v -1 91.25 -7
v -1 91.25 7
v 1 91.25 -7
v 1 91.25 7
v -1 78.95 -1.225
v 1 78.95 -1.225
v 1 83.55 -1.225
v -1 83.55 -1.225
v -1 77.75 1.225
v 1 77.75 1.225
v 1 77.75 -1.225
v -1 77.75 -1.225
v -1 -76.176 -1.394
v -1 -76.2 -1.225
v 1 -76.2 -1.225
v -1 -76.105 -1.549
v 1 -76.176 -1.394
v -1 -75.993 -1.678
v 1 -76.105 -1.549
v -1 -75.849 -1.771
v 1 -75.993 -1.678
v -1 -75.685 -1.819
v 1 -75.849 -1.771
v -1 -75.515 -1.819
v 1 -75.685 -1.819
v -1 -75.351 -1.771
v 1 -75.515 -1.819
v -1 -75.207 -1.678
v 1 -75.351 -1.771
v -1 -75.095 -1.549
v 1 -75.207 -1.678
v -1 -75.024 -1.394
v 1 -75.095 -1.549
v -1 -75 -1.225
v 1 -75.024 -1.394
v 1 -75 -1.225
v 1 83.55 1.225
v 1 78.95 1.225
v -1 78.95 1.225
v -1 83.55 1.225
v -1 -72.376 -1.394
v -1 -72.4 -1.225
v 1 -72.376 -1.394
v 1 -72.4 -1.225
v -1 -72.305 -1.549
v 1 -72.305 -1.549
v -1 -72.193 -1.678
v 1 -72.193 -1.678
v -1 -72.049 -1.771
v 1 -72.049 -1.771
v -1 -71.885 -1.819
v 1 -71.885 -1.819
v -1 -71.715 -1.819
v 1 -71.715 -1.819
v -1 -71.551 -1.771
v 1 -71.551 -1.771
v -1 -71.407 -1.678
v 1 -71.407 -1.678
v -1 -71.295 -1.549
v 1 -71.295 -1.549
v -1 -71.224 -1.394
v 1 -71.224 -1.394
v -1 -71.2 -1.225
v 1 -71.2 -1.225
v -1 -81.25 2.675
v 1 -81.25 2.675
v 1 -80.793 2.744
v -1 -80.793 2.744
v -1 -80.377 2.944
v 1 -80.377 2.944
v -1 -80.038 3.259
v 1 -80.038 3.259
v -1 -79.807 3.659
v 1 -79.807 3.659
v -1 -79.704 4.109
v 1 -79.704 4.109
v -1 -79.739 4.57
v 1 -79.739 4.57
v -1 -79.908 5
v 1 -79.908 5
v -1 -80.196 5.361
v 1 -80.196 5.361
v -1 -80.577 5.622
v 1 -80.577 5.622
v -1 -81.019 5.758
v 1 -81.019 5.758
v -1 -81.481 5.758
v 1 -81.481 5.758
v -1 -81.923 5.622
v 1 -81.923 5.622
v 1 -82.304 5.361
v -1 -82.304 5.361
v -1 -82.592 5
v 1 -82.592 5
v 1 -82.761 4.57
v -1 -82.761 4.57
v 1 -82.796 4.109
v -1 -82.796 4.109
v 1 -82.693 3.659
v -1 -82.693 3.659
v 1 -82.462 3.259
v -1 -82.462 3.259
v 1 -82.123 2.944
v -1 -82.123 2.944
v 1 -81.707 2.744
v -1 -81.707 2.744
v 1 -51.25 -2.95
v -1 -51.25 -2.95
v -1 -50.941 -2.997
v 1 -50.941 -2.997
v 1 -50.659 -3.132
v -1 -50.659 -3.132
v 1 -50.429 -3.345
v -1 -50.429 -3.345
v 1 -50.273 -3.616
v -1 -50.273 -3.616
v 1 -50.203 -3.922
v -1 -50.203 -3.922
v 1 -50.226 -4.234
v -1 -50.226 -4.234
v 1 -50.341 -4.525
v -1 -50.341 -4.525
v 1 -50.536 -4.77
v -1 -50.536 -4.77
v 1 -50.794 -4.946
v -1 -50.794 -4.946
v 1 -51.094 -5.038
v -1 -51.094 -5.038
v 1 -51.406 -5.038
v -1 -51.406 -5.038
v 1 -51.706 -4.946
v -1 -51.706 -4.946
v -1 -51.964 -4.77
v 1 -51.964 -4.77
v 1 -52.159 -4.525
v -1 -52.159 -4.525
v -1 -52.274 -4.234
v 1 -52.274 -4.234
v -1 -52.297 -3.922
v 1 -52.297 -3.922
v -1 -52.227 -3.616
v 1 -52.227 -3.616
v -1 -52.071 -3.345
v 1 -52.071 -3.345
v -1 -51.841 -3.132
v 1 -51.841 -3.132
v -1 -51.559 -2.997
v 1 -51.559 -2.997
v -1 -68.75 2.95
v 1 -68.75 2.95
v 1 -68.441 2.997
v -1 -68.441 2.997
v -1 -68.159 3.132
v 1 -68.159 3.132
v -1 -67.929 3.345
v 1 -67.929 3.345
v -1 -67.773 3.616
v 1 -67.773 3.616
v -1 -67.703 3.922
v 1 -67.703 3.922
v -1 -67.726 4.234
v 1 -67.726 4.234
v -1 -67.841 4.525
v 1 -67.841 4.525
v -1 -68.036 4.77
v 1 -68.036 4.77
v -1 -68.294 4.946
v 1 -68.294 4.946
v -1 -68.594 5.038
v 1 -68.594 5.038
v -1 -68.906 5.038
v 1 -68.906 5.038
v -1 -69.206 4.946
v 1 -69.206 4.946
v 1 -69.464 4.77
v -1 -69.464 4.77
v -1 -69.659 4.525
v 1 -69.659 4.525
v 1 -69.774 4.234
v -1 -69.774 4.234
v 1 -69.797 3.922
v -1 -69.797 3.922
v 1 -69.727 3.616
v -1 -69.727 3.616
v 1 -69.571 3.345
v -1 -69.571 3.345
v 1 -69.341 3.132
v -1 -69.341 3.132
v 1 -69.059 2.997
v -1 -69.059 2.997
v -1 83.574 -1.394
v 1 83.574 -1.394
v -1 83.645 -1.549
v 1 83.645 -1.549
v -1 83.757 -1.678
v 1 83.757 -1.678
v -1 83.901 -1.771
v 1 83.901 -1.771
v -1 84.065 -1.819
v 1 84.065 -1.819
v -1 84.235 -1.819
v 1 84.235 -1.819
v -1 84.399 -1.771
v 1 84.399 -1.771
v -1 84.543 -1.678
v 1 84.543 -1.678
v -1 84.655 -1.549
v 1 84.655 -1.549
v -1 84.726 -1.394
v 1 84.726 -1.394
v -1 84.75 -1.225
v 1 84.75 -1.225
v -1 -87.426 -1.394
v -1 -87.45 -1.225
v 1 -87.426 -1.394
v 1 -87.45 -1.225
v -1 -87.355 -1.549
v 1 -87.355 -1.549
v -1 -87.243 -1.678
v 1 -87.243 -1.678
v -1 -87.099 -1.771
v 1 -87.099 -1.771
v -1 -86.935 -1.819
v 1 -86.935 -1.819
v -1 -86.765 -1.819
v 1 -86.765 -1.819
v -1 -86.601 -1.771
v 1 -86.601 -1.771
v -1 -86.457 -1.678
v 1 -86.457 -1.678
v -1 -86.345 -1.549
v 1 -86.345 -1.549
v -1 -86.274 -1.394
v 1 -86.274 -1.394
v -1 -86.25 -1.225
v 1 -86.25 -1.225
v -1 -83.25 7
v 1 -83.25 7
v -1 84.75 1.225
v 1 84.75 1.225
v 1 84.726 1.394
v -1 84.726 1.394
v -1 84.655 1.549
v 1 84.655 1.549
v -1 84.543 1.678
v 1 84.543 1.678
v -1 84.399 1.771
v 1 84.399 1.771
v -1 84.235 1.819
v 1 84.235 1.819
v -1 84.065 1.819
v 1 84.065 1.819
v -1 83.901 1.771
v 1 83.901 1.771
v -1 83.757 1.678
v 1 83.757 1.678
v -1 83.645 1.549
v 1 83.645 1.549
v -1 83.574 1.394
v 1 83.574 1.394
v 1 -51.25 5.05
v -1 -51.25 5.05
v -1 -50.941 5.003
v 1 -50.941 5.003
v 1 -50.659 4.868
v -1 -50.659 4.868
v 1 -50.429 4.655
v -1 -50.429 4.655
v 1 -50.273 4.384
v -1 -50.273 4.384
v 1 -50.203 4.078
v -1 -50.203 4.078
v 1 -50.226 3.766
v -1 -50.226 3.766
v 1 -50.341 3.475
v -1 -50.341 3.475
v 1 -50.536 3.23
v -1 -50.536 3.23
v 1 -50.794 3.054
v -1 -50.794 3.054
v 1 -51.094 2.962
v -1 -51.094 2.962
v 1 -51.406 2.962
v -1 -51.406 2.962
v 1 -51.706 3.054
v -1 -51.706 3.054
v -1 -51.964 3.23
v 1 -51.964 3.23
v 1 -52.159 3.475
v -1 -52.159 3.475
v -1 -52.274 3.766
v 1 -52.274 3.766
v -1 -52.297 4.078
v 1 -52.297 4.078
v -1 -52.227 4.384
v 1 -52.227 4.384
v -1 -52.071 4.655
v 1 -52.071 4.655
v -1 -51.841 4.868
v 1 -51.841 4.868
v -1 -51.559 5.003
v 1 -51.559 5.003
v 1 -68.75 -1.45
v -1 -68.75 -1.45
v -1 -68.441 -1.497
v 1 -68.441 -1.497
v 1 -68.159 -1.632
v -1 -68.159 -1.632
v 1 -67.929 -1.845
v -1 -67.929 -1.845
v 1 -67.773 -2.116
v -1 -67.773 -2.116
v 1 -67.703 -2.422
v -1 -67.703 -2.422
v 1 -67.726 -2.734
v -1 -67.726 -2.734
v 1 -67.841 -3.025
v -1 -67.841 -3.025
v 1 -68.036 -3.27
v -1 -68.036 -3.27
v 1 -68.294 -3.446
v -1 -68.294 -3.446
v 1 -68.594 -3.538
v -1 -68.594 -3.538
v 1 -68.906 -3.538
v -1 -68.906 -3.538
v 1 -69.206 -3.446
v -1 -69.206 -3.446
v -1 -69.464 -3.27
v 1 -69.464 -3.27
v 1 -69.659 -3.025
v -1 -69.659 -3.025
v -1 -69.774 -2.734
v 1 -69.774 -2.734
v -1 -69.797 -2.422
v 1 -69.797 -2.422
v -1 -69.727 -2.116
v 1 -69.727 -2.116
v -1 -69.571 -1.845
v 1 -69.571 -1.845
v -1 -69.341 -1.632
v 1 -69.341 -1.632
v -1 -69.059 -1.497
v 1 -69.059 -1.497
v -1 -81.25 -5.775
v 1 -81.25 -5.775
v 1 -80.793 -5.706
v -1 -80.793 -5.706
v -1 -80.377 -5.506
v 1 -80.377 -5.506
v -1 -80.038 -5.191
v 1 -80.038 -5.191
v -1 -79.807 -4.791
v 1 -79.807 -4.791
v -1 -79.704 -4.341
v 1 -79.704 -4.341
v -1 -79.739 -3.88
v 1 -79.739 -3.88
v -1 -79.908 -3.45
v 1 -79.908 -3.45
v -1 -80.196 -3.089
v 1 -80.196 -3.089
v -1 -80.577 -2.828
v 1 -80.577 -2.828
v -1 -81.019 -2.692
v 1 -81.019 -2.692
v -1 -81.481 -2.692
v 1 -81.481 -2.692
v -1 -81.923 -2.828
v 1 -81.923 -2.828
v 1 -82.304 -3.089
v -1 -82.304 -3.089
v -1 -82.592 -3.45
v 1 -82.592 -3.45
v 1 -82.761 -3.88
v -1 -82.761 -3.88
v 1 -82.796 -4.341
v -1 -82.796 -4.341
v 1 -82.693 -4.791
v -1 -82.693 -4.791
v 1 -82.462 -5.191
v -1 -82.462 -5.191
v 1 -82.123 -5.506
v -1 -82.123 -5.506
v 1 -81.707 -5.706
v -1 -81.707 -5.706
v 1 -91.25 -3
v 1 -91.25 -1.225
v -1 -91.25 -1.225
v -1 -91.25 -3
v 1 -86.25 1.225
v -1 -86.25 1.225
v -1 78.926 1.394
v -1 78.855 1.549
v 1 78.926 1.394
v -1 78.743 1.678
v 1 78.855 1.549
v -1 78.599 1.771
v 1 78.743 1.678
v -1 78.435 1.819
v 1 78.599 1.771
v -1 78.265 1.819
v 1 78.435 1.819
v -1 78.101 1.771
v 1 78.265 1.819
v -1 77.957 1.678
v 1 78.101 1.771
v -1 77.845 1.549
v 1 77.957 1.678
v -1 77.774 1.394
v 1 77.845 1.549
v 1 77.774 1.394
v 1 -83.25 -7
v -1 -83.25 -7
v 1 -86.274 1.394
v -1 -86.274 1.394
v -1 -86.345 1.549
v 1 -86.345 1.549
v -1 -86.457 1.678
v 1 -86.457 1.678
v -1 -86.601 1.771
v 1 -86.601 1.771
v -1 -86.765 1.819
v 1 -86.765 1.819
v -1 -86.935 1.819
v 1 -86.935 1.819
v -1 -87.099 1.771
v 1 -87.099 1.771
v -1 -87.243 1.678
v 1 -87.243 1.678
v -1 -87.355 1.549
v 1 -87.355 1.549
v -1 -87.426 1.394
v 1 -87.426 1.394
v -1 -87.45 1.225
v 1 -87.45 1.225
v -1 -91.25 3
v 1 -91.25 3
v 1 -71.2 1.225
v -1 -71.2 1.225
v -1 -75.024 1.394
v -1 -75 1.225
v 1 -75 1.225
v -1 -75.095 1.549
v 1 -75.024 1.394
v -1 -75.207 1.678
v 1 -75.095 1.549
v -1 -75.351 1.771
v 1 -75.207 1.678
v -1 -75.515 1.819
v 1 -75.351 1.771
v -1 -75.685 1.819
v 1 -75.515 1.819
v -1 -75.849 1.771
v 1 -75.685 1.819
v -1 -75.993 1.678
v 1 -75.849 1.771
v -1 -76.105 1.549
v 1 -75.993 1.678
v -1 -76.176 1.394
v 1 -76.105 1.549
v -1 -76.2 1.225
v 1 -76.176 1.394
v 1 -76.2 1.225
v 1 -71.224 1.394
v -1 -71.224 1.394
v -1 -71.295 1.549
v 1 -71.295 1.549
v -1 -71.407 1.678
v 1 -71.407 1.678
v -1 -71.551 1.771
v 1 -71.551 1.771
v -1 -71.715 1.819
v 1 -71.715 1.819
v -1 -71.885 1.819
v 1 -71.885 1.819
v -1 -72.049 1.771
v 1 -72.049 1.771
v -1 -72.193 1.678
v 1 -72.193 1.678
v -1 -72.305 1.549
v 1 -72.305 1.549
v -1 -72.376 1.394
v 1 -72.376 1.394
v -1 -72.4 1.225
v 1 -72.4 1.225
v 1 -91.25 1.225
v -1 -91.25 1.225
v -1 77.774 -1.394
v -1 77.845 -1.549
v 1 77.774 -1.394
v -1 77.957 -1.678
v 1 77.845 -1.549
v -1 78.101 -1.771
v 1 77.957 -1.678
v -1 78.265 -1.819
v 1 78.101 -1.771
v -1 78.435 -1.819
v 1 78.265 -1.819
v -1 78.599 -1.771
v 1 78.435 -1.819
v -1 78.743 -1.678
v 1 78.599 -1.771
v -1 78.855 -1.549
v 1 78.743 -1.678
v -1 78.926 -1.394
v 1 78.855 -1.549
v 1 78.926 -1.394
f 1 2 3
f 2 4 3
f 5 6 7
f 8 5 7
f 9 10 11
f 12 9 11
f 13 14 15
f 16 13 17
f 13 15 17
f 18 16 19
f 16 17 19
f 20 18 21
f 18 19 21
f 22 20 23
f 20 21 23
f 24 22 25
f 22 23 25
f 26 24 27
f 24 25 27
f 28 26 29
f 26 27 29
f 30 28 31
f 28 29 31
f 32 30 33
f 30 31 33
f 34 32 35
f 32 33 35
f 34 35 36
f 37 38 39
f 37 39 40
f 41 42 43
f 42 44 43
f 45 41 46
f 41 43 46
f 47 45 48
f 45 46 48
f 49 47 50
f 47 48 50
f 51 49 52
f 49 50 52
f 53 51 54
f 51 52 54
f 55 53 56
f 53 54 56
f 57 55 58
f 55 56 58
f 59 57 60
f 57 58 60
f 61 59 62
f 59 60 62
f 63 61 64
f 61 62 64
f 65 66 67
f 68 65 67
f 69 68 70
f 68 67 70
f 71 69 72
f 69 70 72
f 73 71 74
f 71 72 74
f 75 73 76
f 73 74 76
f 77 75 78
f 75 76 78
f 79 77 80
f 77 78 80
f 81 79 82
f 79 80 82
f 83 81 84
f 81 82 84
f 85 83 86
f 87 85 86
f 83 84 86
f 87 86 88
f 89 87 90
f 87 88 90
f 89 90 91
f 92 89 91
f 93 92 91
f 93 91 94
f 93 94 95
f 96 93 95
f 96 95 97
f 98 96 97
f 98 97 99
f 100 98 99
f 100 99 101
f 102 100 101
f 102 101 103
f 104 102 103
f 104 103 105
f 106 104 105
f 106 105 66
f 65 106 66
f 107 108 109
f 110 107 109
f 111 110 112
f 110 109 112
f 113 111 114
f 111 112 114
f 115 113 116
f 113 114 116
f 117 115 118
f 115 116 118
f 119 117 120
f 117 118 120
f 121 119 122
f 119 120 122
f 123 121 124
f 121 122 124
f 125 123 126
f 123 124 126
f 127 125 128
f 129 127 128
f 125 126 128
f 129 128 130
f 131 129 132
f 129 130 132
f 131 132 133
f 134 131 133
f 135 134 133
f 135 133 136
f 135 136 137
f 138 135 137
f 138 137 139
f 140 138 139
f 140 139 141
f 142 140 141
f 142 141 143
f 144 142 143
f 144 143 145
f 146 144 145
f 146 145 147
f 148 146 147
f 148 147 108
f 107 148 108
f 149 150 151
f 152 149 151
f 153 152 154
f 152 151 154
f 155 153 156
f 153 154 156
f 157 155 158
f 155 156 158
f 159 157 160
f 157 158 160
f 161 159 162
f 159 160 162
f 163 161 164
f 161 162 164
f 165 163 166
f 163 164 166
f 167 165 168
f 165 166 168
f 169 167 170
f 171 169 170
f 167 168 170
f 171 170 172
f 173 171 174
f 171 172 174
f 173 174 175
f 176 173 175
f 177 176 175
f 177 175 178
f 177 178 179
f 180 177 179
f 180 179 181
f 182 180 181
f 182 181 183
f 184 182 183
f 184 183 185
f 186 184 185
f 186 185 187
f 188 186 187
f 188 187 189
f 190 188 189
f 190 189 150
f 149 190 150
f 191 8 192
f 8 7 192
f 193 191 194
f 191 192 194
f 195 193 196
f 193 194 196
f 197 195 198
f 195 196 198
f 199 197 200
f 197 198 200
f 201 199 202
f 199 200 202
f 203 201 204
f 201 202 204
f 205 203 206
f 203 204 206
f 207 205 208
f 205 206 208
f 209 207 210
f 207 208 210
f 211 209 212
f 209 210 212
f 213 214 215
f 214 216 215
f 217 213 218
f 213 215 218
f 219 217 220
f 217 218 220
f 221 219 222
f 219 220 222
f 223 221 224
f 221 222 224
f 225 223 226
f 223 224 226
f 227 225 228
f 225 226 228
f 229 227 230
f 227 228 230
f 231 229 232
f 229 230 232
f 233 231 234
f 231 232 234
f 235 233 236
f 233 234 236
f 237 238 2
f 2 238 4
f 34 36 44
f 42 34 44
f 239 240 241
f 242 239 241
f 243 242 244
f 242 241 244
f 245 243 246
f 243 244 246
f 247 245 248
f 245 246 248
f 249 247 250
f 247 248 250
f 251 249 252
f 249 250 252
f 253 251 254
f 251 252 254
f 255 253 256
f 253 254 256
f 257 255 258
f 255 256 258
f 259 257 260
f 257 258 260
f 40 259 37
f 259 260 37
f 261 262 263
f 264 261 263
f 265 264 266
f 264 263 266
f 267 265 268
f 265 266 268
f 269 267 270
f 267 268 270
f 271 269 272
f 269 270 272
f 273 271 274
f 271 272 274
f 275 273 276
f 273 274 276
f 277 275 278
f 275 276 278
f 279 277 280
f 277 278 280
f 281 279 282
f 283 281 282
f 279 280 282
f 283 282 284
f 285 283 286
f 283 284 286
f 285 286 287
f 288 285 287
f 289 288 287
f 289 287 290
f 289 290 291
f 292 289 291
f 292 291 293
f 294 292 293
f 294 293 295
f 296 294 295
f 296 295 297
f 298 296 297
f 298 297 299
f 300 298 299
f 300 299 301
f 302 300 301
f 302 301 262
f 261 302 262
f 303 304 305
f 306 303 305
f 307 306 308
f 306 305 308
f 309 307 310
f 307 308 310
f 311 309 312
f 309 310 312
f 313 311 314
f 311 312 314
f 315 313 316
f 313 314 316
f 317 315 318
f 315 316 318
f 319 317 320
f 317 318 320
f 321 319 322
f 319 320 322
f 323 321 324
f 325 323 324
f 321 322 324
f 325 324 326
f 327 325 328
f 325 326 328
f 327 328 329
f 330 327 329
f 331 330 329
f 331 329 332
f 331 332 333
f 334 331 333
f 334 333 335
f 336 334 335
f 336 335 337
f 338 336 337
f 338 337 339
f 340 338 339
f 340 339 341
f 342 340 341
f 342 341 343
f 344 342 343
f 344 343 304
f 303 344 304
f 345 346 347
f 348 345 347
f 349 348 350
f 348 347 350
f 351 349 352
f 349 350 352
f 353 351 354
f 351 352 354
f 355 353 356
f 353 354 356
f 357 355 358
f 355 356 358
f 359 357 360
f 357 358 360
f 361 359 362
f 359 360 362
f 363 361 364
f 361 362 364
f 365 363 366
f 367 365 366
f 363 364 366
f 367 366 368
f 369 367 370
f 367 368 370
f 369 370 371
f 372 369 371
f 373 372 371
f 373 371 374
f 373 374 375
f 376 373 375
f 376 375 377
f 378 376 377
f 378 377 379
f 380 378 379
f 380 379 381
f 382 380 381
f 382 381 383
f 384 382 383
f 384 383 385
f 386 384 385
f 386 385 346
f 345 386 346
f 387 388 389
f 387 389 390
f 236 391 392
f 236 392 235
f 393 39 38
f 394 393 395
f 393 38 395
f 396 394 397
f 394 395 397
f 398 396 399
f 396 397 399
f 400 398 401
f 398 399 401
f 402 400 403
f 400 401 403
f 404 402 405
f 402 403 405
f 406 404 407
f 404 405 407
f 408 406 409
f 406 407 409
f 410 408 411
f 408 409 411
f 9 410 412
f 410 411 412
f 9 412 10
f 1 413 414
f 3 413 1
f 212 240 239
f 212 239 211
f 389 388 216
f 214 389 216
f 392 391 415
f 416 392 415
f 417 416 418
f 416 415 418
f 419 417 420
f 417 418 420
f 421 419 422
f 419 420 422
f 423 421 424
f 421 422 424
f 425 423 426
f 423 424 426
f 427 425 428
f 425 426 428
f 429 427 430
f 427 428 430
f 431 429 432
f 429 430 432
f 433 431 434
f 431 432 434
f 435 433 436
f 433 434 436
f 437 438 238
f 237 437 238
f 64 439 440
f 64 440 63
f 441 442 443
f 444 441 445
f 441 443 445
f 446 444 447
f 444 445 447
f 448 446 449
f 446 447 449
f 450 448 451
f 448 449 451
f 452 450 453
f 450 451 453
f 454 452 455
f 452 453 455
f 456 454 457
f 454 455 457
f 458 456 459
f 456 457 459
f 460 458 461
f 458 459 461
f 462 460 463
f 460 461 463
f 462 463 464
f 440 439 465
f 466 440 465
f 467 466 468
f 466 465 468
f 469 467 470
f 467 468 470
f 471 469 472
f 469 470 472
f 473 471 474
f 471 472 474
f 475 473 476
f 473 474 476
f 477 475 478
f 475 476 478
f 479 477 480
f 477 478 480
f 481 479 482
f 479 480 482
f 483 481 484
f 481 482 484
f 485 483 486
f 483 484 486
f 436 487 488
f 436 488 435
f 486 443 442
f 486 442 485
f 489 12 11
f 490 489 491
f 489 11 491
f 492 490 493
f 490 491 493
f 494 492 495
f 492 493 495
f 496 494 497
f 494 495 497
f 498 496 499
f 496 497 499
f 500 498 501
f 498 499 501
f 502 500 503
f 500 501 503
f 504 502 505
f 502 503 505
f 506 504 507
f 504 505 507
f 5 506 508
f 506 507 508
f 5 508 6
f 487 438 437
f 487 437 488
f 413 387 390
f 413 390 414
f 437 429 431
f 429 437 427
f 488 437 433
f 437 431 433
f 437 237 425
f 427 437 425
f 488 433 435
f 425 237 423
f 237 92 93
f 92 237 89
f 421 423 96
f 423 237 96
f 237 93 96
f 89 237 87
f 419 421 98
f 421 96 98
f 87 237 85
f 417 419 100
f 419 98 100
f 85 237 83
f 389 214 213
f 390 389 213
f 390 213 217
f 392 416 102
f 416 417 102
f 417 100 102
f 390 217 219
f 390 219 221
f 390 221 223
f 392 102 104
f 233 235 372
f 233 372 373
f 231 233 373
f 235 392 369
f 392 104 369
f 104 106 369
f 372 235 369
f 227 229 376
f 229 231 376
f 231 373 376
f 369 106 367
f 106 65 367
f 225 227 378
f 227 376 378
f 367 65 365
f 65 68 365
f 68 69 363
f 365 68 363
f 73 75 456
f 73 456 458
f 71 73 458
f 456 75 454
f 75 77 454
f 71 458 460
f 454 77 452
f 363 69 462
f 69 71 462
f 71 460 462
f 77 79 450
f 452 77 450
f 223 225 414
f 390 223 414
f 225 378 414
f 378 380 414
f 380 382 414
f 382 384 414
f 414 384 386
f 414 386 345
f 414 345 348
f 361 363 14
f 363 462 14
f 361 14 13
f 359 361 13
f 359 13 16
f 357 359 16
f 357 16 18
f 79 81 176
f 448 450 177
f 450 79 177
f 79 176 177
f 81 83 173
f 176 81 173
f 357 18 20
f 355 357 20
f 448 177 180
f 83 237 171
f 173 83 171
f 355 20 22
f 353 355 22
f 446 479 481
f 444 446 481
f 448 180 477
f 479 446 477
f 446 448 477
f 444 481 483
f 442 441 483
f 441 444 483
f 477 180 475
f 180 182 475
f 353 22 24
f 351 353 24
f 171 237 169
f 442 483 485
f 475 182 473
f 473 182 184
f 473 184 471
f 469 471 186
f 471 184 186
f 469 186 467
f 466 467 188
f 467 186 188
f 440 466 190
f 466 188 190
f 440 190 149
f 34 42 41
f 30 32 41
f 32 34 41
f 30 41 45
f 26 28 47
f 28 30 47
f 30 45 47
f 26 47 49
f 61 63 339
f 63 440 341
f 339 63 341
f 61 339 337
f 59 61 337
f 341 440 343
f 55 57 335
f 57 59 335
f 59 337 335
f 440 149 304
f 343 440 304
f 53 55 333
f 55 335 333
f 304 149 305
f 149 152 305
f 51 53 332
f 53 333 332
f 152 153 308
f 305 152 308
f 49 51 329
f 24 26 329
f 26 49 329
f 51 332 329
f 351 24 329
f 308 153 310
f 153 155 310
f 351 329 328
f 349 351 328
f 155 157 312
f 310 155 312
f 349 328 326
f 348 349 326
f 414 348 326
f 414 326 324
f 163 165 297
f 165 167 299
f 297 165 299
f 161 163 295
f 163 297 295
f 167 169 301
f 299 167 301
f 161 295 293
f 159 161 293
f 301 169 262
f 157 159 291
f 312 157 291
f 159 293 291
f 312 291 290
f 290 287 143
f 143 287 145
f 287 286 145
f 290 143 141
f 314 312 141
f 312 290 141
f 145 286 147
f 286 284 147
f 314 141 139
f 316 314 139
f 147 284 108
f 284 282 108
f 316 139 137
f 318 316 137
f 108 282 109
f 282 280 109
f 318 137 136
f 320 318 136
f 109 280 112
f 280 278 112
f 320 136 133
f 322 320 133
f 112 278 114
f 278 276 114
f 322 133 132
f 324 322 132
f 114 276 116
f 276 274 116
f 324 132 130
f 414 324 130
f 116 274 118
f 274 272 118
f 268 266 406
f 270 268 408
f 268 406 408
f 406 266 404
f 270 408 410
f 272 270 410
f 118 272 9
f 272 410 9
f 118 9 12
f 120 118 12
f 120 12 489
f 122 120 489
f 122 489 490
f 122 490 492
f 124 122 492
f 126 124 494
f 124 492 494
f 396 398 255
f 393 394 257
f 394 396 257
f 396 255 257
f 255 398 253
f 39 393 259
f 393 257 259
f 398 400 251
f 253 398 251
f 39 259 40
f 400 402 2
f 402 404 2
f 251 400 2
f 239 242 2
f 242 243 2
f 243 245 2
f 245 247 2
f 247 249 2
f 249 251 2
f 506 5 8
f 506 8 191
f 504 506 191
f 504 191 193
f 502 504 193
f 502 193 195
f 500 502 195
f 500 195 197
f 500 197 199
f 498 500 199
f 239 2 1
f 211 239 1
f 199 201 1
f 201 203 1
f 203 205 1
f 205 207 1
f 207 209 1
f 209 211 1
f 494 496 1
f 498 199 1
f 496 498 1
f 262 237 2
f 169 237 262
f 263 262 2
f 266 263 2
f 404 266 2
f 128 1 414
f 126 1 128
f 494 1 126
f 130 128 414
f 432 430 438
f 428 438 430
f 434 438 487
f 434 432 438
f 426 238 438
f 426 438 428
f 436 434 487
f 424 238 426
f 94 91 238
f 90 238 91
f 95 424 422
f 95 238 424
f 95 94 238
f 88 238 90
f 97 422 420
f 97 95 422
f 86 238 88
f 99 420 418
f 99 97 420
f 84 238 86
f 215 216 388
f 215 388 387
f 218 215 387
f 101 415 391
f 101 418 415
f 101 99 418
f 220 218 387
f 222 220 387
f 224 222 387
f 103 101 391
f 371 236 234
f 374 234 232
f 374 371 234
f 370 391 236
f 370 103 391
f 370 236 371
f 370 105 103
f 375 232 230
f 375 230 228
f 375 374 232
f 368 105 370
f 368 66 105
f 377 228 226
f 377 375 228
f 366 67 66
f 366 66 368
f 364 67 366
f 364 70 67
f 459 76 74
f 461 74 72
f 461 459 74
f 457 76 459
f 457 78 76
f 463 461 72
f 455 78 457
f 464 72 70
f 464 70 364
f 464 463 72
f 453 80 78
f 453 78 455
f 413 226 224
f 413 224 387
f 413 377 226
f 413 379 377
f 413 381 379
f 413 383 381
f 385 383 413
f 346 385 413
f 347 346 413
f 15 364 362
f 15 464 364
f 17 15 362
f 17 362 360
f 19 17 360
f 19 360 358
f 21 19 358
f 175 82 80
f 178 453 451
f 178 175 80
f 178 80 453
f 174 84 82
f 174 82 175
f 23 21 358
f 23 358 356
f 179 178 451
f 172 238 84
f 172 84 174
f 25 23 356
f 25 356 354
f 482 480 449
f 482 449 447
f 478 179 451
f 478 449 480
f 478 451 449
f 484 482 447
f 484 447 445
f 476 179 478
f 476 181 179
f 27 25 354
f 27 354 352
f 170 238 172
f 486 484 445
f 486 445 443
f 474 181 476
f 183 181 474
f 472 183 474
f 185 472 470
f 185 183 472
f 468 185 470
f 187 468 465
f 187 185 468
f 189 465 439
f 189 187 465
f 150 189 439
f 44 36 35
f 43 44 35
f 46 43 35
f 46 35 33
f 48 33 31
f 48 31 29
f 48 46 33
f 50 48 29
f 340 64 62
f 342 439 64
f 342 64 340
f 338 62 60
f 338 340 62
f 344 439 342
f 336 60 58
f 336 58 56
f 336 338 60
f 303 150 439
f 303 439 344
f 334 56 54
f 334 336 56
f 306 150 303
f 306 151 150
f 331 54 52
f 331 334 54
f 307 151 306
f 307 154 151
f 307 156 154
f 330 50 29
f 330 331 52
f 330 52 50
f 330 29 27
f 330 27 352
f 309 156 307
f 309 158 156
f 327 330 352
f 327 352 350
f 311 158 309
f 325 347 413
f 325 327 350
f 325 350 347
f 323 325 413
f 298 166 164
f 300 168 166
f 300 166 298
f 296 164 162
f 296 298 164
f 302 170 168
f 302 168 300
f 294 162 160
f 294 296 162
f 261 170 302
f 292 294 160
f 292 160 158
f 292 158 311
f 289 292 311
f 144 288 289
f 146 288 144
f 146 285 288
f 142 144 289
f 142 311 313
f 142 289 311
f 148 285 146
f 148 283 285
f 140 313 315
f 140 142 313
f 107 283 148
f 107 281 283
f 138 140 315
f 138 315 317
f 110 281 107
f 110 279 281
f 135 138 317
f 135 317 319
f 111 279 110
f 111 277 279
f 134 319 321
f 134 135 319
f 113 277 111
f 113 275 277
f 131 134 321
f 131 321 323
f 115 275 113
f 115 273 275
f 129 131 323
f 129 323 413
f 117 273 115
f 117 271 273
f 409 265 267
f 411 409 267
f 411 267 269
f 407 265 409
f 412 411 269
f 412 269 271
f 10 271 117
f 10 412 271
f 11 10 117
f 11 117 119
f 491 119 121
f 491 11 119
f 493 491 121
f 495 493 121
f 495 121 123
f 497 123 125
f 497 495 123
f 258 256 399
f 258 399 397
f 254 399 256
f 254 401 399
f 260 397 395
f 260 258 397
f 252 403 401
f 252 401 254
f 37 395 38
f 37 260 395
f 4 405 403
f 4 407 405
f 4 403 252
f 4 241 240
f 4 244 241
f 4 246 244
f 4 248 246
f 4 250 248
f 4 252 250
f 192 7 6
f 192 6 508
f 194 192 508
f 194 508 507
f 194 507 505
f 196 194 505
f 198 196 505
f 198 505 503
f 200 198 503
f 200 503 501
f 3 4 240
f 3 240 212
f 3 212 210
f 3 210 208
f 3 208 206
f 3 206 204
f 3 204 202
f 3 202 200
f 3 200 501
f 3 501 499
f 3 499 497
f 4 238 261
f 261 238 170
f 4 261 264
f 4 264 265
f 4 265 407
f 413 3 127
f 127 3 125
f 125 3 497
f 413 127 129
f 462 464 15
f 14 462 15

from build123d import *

# Parameters (mm, degrees)
SKETCH_1_W           = 14
SKETCH_1_H           = 182.5
EXTRUDE_1_DEPTH      = 1
SKETCH_2_W           = 2.45
SKETCH_2_H           = 5
CUT_EXTRUDE_1_DEPTH  = 3
SKETCH_3_R           = 0.6
CUT_EXTRUDE_2_DEPTH  = 3
SKETCH_6_W           = 2.45
SKETCH_6_H           = 5
CUT_EXTRUDE_4_DEPTH  = 3
SKETCH_7_R           = 0.6
CUT_EXTRUDE_5_DEPTH  = 3
SKETCH_8_R           = 1.55
CUT_EXTRUDE_6_DEPTH  = 3
SKETCH_9_W           = 2.45
SKETCH_9_H           = 7
CUT_EXTRUDE_7_DEPTH  = 3
SKETCH_10_R          = 0.6
CUT_EXTRUDE_8_DEPTH  = 3
CUT_EXTRUDE_9_DEPTH  = 3
SKETCH_12_R          = 1.05
CUT_EXTRUDE_10_DEPTH = 3
SKETCH_14_R          = 1.05
CUT_EXTRUDE_11_DEPTH = 3
SKETCH_15_R          = 1.05
CUT_EXTRUDE_12_DEPTH = 3


with BuildPart() as part:
    # 草图1 → 凸台-拉伸1 (new body, symmetric)
    with BuildSketch(Plane(origin=(0, 0, 0), x_dir=(0, 0, -1), z_dir=(1, 0, 0))):
        Rectangle(SKETCH_1_W, SKETCH_1_H)
    extrude(amount=EXTRUDE_1_DEPTH, both=True)

    # 草图2 → 切除-拉伸1 (cut, through all)
    with BuildSketch(Plane(origin=(1, 0, 0), x_dir=(0, 0, -1), z_dir=(1, 0, 0))):
        with Locations((0, -88.75)):
            Rectangle(SKETCH_2_W, SKETCH_2_H)
    extrude(amount=-CUT_EXTRUDE_1_DEPTH, mode=Mode.SUBTRACT)

    # 草图3 → 切除-拉伸2 (cut, through all)
    with BuildSketch(Plane(origin=(1, 0, 0), x_dir=(0, 0, -1), z_dir=(1, 0, 0))):
        with Locations((-1.225, -86.85)):
            Circle(SKETCH_3_R)
        with Locations((1.225, -86.85)):
            Circle(SKETCH_3_R)
    extrude(amount=-CUT_EXTRUDE_2_DEPTH, mode=Mode.SUBTRACT)

    # 草图6 → 切除-拉伸4 (cut, through all)
    with BuildSketch(Plane(origin=(1, 0, 0), x_dir=(0, 0, -1), z_dir=(1, 0, 0))):
        with Locations((0, -73.7)):
            Rectangle(SKETCH_6_W, SKETCH_6_H)
    extrude(amount=-CUT_EXTRUDE_4_DEPTH, mode=Mode.SUBTRACT)

    # 草图7 → 切除-拉伸5 (cut, through all)
    with BuildSketch(Plane(origin=(1, 0, 0), x_dir=(0, 0, -1), z_dir=(1, 0, 0))):
        with Locations((-1.225, -71.8)):
            Circle(SKETCH_7_R)
        with Locations((-1.225, -75.6)):
            Circle(SKETCH_7_R)
        with Locations((1.225, -71.8)):
            Circle(SKETCH_7_R)
        with Locations((1.225, -75.6)):
            Circle(SKETCH_7_R)
    extrude(amount=-CUT_EXTRUDE_5_DEPTH, mode=Mode.SUBTRACT)

    # 草图8 → 切除-拉伸6 (cut, through all)
    with BuildSketch(Plane(origin=(1, 0, 0), x_dir=(0, 0, -1), z_dir=(1, 0, 0))):
        with Locations((-4.225, -81.25)):
            Circle(SKETCH_8_R)
        with Locations((4.225, -81.25)):
            Circle(SKETCH_8_R)
    extrude(amount=-CUT_EXTRUDE_6_DEPTH, mode=Mode.SUBTRACT)

    # 草图9 → 切除-拉伸7 (cut, through all)
    with BuildSketch(Plane(origin=(1, 0, 0), x_dir=(0, 0, -1), z_dir=(1, 0, 0))):
        with Locations((0, 81.25)):
            Rectangle(SKETCH_9_W, SKETCH_9_H)
    extrude(amount=-CUT_EXTRUDE_7_DEPTH, mode=Mode.SUBTRACT)

    # 草图10 → 切除-拉伸8 (cut, through all)
    with BuildSketch(Plane(origin=(1, 0, 0), x_dir=(0, 0, -1), z_dir=(1, 0, 0))):
        with Locations((-1.225, 84.15)):
            Circle(SKETCH_10_R)
        with Locations((-1.225, 78.35)):
            Circle(SKETCH_10_R)
        with Locations((1.225, 84.15)):
            Circle(SKETCH_10_R)
        with Locations((1.225, 78.35)):
            Circle(SKETCH_10_R)
    extrude(amount=-CUT_EXTRUDE_8_DEPTH, mode=Mode.SUBTRACT)

    # 草图11 → 切除-拉伸9 (cut, through all)
    with BuildSketch(Plane(origin=(1, 0, 0), x_dir=(0, 0, -1), z_dir=(1, 0, 0))):
        Polygon((-3, -91.25), (-7, -83.25), (-7, -91.25), align=None)
        Polygon((7, -83.25), (7, -91.25), (3, -91.25), align=None)
    extrude(amount=-CUT_EXTRUDE_9_DEPTH, mode=Mode.SUBTRACT)

    # 草图12 → 切除-拉伸10 (cut, through all)
    with BuildSketch(Plane(origin=(1, 0, 0), x_dir=(0, 0, -1), z_dir=(1, 0, 0))):
        with Locations((-4, -68.75)):
            Circle(SKETCH_12_R)
    extrude(amount=-CUT_EXTRUDE_10_DEPTH, mode=Mode.SUBTRACT)

    # 草图14 → 切除-拉伸11 (cut, through all)
    with BuildSketch(Plane.ZY.offset(1)):
        with Locations((-2.5, -68.75)):
            Circle(SKETCH_14_R)
    extrude(amount=-CUT_EXTRUDE_11_DEPTH, mode=Mode.SUBTRACT)

    # 草图15 → 切除-拉伸12 (cut, through all)
    with BuildSketch(Plane.ZY.offset(1)):
        with Locations((-4, -51.25)):
            Circle(SKETCH_15_R)
        with Locations((4, -51.25)):
            Circle(SKETCH_15_R)
    extrude(amount=-CUT_EXTRUDE_12_DEPTH, mode=Mode.SUBTRACT)


solid = part.part
